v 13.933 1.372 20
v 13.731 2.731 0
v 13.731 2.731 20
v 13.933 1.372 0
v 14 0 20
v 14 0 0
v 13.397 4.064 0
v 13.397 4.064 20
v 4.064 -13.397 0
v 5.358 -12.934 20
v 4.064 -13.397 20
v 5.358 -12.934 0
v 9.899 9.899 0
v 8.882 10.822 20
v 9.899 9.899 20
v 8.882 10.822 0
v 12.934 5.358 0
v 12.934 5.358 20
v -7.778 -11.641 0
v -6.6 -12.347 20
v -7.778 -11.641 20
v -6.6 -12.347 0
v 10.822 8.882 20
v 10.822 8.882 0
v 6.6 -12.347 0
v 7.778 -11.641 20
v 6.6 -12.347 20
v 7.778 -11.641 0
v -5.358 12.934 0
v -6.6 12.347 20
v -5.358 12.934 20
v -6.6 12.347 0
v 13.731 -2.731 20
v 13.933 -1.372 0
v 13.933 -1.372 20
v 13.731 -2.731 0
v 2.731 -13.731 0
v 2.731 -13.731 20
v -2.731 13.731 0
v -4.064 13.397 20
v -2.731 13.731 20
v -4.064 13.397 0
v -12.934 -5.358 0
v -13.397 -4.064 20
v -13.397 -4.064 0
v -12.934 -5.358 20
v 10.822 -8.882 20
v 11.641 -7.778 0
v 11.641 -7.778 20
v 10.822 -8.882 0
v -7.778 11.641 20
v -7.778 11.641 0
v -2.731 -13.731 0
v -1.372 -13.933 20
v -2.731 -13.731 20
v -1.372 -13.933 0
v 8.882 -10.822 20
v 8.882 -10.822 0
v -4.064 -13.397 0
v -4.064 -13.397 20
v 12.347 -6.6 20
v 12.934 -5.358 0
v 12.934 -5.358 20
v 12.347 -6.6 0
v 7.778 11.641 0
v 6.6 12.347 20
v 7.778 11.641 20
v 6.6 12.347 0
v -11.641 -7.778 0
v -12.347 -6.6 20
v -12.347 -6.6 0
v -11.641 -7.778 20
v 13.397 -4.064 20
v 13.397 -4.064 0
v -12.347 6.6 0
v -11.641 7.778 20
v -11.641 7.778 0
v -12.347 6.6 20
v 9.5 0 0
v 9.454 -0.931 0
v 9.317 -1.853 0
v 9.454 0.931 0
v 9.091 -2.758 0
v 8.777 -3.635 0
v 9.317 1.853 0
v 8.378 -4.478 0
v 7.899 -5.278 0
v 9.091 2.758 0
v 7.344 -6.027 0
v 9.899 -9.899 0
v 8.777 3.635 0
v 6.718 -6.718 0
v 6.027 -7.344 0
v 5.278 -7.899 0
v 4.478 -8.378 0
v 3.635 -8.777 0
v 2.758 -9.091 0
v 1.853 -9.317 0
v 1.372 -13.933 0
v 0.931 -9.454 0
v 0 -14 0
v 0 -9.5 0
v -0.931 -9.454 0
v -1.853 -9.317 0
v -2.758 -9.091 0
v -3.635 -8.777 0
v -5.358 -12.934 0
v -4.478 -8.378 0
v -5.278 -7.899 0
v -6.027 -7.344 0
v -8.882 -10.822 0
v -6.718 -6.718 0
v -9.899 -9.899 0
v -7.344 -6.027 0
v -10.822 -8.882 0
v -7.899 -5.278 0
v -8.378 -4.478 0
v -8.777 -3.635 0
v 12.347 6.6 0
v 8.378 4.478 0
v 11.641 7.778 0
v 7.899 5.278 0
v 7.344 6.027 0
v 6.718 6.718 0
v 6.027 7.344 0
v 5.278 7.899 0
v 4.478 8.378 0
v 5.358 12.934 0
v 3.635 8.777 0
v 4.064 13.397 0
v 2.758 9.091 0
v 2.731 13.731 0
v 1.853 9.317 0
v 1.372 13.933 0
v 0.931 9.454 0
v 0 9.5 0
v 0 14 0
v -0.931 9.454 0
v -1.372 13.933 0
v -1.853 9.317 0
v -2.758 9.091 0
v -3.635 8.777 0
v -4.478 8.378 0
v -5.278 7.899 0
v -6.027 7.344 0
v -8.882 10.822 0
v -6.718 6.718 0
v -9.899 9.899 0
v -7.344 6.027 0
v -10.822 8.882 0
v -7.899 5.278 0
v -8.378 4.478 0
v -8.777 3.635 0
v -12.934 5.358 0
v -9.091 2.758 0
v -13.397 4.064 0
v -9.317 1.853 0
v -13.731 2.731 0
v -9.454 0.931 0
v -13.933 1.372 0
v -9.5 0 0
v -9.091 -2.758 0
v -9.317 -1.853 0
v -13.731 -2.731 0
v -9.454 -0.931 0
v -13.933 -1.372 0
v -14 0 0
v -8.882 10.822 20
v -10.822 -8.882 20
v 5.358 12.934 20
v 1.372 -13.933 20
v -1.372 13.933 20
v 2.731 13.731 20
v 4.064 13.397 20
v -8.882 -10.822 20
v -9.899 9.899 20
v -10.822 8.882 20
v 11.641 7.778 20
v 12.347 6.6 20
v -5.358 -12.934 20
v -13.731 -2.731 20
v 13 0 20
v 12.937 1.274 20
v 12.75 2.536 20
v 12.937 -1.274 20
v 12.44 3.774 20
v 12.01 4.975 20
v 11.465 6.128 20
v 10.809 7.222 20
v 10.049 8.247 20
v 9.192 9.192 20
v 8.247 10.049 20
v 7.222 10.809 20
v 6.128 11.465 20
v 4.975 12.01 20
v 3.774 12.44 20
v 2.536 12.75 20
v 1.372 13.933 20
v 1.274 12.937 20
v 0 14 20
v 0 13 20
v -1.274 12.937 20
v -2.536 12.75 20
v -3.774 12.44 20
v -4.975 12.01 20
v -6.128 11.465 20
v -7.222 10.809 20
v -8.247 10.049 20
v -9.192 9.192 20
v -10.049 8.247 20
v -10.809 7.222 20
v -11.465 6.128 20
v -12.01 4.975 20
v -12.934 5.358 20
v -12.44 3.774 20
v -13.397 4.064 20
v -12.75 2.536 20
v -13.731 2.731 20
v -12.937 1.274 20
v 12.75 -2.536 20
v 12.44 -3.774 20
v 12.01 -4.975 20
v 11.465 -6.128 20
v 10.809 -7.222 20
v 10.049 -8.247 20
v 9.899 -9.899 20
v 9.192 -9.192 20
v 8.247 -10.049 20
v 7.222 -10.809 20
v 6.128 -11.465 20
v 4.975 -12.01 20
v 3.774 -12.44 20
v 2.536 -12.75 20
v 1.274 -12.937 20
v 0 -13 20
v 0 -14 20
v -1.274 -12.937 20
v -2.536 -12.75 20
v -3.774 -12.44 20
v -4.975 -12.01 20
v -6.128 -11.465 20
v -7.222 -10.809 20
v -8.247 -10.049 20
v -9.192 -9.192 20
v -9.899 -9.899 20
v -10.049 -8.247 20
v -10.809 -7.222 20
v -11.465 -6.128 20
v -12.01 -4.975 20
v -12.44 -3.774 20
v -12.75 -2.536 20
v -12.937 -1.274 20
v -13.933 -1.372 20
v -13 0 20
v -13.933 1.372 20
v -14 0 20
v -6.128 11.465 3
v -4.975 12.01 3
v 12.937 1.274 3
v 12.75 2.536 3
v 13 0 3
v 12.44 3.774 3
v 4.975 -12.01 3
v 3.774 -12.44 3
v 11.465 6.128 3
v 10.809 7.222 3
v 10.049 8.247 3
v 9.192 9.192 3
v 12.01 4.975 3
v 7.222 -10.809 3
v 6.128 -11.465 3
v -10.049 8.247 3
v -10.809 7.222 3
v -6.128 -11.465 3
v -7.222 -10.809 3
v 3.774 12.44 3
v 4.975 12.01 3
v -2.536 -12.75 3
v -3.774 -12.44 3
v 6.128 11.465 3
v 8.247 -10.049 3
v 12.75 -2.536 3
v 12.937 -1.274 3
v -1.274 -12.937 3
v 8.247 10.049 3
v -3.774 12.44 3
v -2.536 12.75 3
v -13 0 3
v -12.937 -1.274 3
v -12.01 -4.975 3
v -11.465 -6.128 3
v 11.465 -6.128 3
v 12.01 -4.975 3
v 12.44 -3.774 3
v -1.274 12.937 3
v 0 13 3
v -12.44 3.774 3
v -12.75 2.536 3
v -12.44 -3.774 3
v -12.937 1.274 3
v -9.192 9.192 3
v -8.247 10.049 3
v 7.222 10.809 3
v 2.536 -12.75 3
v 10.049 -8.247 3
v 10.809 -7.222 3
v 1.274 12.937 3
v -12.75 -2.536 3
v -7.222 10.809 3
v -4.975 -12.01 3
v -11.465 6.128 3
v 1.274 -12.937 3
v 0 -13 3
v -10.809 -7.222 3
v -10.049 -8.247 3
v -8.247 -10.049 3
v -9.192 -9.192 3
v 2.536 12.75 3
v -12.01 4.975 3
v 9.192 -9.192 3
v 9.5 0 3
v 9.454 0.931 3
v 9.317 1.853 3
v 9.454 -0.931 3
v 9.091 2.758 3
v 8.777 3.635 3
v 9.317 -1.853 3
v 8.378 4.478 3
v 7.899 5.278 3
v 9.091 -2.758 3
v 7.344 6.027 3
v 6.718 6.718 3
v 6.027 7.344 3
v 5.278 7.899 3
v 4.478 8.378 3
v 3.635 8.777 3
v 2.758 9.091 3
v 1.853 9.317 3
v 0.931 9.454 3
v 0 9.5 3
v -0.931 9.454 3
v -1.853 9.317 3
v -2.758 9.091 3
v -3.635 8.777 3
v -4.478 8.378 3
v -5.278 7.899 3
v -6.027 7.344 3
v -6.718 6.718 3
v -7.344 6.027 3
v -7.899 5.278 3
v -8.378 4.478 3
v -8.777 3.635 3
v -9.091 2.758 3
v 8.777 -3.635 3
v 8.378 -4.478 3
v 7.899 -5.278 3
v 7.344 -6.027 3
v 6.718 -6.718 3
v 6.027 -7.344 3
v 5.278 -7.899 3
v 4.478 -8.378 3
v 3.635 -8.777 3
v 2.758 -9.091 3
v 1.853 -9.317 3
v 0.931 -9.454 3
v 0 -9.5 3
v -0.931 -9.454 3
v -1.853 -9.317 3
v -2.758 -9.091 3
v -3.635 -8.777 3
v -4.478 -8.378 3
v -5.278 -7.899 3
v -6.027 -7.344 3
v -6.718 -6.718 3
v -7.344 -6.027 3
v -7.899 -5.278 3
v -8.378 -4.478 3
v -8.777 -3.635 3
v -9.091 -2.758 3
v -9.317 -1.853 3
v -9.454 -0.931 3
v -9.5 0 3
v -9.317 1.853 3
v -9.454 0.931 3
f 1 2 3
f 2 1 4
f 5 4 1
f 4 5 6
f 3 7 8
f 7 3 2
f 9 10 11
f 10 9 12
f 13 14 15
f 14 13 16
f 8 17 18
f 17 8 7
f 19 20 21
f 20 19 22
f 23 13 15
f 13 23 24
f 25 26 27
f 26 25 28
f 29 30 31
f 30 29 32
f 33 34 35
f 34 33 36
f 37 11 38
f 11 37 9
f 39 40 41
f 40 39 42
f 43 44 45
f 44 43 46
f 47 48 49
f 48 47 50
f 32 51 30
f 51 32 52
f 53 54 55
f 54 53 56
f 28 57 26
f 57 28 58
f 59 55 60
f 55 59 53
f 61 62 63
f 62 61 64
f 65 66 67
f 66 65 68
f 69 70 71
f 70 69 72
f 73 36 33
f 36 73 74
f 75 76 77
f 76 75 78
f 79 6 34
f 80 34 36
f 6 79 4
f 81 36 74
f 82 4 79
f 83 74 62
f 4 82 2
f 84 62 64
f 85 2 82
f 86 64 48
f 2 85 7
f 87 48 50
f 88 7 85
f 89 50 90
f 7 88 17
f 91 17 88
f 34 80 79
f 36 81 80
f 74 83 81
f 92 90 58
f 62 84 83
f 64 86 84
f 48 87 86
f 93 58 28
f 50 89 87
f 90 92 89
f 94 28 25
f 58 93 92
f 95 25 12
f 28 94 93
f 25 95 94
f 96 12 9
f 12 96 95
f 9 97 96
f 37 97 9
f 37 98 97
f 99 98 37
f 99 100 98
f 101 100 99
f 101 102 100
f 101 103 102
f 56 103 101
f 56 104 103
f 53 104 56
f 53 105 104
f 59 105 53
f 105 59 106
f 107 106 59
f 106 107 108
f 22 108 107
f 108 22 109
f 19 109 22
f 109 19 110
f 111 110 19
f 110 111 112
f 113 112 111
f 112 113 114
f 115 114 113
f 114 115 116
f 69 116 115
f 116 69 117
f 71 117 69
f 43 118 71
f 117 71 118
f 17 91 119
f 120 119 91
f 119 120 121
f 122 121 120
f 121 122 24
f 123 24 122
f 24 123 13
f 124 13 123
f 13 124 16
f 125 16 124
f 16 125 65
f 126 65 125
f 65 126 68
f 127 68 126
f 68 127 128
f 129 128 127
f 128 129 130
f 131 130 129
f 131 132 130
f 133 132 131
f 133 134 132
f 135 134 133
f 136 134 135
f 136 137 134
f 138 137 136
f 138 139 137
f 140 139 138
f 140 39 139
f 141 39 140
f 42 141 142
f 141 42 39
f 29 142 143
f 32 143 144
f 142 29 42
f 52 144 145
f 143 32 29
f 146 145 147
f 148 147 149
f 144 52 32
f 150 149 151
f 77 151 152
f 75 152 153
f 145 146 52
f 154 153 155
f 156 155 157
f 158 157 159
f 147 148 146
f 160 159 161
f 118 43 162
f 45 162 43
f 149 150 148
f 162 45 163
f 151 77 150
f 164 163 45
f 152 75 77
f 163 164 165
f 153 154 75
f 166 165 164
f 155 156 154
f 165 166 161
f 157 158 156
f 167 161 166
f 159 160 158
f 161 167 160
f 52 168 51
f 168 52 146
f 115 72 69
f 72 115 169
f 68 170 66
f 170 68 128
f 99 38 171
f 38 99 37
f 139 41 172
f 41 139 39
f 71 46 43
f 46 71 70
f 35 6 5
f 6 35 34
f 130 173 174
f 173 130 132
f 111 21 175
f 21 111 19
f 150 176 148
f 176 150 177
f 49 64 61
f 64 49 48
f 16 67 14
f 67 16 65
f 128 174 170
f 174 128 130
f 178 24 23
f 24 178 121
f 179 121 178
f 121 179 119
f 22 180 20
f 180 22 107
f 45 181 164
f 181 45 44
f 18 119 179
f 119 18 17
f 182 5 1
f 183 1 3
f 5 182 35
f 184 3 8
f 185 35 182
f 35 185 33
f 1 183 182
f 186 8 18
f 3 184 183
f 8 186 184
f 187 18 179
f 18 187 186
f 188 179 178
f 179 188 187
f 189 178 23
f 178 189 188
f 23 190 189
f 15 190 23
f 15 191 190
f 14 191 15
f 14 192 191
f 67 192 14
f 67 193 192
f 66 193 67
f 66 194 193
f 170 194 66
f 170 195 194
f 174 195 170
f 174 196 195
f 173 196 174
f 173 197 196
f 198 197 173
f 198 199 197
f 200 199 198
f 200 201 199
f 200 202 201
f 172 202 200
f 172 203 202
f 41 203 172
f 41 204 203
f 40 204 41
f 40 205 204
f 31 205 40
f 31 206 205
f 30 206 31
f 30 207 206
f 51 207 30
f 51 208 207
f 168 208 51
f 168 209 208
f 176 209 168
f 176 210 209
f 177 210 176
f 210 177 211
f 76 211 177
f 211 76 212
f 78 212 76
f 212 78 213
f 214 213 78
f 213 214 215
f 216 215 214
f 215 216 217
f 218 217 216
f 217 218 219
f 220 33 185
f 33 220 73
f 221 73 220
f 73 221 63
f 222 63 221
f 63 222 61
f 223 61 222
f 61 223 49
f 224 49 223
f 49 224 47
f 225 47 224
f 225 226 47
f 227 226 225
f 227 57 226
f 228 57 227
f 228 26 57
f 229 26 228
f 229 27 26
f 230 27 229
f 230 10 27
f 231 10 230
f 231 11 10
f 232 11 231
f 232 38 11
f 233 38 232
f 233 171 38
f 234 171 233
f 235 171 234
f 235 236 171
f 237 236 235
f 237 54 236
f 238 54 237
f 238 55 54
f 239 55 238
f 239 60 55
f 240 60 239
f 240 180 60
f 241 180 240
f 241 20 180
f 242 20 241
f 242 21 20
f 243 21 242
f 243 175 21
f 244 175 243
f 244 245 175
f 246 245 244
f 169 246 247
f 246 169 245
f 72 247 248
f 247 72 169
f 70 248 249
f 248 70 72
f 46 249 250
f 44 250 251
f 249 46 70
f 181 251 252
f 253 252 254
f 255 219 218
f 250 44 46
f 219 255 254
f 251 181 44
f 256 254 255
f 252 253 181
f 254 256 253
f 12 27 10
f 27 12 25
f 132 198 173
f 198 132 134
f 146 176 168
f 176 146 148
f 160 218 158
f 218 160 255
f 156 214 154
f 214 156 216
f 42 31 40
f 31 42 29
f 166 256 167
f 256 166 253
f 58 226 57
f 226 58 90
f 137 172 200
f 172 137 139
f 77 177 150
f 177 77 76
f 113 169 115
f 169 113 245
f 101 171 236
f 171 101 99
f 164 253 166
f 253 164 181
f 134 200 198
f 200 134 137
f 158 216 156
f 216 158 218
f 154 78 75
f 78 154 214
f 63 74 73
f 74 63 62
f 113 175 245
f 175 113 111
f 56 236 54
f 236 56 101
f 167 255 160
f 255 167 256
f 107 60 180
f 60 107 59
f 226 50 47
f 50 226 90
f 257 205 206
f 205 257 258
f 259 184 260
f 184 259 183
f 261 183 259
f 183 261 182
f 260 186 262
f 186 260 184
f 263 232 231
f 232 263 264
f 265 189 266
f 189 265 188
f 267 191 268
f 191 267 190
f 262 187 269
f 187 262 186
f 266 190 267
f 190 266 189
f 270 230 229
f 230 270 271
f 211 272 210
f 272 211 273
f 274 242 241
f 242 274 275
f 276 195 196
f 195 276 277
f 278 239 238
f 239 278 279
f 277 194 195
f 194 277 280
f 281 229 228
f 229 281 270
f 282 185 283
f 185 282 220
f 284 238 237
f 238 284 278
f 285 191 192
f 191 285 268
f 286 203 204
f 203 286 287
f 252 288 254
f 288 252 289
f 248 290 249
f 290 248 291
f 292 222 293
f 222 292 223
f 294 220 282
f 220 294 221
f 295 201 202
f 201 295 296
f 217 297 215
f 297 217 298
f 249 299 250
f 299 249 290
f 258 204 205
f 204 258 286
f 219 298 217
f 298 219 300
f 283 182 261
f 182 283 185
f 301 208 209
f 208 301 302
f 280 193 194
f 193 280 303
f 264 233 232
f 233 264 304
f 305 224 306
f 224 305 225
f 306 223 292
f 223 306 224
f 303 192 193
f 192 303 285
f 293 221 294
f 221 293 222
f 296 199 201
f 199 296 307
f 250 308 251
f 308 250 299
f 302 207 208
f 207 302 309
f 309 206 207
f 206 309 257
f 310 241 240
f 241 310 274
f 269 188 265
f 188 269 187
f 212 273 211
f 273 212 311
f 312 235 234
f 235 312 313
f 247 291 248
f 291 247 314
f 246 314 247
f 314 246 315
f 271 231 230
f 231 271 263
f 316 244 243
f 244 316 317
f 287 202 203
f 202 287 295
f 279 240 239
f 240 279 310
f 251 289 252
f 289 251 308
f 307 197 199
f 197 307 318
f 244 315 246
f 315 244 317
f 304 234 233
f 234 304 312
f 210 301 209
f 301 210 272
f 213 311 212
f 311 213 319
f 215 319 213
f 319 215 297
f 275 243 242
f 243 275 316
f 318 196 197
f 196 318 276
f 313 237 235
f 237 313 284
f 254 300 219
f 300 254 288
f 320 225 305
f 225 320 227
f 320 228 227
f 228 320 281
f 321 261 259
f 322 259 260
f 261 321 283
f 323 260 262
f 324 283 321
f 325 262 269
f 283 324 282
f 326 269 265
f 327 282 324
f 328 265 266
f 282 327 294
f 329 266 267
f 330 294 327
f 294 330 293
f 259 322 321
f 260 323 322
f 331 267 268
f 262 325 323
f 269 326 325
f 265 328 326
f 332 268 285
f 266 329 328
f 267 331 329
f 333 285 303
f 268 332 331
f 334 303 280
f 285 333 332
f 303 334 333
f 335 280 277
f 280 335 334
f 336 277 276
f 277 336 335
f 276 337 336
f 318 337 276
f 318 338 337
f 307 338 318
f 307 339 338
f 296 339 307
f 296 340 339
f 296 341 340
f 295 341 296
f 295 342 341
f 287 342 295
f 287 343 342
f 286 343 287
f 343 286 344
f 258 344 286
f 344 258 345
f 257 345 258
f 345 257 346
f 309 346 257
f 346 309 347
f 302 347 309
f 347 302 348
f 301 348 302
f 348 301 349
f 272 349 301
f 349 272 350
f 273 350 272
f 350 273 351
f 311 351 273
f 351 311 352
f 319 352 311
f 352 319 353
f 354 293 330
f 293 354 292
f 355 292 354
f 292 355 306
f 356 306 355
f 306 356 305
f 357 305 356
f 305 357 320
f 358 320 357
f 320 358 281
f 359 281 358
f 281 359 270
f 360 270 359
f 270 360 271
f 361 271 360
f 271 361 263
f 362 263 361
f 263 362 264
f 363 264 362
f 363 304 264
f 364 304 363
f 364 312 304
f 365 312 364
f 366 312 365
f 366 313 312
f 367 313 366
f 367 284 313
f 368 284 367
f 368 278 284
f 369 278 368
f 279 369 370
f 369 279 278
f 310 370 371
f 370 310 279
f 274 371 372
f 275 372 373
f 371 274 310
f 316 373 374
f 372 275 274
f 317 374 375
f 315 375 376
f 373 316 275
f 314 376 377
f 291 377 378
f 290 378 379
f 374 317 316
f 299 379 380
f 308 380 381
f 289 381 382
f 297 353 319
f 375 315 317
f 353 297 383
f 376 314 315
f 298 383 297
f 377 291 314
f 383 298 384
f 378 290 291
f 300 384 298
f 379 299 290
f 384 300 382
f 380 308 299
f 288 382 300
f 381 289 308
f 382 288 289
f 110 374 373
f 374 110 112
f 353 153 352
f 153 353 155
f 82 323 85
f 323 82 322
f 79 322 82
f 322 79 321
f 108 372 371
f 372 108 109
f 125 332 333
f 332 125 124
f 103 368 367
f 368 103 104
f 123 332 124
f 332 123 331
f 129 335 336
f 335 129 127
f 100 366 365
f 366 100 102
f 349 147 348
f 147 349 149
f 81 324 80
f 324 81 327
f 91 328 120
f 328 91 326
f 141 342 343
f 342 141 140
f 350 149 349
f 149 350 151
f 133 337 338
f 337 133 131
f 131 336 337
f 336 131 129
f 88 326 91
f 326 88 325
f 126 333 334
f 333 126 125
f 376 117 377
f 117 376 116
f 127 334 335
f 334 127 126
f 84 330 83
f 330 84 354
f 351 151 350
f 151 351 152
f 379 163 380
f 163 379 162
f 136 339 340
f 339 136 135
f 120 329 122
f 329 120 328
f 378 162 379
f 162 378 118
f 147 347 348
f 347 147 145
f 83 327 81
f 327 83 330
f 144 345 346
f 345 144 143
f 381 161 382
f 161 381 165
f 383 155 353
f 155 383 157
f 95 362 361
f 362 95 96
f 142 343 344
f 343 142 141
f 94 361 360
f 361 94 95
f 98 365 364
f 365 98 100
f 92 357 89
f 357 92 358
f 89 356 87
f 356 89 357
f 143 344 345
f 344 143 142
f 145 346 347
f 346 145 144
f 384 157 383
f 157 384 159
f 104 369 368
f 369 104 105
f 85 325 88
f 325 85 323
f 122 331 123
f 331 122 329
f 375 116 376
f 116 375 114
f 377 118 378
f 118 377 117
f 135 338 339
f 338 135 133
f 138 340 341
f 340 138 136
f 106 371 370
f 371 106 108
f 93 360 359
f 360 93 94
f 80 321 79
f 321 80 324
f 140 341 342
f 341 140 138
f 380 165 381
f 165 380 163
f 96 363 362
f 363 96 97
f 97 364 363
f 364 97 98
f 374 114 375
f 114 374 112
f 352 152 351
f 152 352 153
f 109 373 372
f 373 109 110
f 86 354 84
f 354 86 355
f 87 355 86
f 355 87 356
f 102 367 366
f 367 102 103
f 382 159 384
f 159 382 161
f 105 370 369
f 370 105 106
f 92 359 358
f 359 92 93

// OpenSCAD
//CUSTOMIZER VARIABLES



//CUSTOMIZER VARIABLES END



union() {
    difference () {
                cylinder (h = 20, r = 14, $fn = 64);
                translate([0,0,-0.5]);
                cylinder (h = 22, r = 13, $fn = 64);
        }
        union () {
            difference () {
                cylinder (h = 3, r = 14, $fn = 64);
                cylinder (h = 3, r = 9.5, $fn = 64);
            }
        }
           
                  
    }
